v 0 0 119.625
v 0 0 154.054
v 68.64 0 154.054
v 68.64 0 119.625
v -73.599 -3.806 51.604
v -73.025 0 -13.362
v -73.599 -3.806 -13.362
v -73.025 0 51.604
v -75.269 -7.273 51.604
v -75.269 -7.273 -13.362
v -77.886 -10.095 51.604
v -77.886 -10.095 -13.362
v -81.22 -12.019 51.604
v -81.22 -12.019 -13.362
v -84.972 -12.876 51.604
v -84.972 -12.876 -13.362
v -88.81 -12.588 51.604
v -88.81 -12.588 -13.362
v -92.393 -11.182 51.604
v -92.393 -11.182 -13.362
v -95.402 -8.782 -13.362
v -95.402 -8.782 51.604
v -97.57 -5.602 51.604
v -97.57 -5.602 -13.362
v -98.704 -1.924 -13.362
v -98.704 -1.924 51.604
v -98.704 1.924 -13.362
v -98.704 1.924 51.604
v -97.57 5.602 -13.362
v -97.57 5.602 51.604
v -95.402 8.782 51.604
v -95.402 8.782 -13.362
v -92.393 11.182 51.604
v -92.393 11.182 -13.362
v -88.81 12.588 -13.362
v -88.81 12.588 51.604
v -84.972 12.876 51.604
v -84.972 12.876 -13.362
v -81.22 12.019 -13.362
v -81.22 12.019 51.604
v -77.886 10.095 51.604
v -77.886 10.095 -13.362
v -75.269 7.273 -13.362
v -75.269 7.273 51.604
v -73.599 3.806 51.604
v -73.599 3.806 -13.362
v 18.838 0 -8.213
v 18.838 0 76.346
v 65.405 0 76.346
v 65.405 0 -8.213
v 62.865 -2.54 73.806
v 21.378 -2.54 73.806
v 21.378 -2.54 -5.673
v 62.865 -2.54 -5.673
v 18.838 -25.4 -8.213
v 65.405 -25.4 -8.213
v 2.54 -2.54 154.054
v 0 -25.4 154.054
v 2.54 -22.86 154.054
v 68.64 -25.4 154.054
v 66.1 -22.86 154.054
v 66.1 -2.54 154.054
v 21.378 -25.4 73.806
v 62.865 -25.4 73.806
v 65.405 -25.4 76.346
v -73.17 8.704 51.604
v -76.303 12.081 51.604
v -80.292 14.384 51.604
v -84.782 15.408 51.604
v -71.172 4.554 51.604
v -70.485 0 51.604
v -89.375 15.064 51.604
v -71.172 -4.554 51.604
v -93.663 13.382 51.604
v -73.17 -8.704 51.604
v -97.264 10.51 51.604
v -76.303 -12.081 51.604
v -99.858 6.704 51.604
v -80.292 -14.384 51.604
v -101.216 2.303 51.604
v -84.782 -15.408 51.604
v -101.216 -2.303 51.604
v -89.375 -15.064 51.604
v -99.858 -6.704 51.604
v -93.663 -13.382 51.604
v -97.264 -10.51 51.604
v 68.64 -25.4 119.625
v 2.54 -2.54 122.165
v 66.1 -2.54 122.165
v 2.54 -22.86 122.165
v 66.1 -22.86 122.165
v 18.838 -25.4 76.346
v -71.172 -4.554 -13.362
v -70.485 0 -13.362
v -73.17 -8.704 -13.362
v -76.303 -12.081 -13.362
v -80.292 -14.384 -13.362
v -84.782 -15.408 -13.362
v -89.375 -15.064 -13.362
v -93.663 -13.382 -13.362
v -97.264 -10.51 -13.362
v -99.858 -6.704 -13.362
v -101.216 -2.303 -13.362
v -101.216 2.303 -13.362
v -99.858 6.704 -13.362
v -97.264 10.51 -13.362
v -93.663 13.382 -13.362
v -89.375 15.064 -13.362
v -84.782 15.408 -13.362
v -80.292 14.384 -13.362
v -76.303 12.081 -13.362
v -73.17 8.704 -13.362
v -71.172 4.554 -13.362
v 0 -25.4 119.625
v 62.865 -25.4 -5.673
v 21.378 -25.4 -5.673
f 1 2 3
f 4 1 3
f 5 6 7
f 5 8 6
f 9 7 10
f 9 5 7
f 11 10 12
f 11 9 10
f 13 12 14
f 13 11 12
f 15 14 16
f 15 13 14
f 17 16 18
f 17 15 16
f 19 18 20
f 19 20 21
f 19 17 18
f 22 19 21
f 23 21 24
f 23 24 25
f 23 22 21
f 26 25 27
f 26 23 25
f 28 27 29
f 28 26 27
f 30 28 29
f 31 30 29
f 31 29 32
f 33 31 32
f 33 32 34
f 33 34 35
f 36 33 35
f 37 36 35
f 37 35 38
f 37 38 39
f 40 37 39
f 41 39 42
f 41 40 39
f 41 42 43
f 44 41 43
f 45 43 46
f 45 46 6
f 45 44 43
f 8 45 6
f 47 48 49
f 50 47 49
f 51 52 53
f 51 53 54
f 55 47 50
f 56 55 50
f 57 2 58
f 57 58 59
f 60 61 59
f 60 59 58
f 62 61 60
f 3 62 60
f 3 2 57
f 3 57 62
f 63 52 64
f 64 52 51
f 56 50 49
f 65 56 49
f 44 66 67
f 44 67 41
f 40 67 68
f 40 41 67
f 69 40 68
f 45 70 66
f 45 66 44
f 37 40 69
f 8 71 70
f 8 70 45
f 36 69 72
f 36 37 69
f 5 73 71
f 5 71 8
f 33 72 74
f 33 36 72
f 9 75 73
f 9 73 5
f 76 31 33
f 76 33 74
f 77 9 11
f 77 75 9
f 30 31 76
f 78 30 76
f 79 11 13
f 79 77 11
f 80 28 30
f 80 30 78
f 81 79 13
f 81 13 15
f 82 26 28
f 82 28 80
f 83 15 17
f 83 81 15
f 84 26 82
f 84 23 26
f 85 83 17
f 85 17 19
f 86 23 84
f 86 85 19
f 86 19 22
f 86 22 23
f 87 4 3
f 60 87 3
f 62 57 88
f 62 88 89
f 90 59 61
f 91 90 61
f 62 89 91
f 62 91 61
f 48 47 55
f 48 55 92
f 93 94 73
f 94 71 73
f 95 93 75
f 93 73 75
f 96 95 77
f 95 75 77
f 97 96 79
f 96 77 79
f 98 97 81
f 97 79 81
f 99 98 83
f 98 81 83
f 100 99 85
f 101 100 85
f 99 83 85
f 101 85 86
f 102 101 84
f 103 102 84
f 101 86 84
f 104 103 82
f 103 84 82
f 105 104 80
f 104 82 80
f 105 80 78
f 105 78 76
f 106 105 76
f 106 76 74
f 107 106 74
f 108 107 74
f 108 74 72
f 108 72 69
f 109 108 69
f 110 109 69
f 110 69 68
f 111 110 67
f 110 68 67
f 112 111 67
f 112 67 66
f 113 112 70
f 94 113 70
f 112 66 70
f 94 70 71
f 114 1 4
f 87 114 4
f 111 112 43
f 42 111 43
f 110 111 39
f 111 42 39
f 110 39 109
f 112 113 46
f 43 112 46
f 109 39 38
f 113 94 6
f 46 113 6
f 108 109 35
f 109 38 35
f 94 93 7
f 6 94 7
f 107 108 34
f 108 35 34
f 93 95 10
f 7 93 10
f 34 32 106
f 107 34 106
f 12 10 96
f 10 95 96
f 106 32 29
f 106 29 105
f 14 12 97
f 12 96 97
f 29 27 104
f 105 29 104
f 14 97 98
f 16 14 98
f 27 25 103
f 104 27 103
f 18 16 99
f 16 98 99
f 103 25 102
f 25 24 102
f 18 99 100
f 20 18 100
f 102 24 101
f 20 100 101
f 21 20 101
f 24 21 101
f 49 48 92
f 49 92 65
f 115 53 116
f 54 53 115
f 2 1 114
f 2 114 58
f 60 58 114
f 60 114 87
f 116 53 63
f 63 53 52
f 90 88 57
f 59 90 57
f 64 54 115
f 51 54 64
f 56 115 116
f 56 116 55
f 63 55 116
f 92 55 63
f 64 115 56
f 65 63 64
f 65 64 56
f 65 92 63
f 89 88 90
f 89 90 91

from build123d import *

# Parameters (mm, degrees)
F3_W     = 68.6399489641
F3_H     = 34.4287902117
F0_DEPTH = 25.4
F3_W_2   = 15.4516622424
F3_H_2   = 64.9661496282
F3_W_3   = 46.5666726232
F3_H_3   = 84.5590159297
F3_W_4   = 104.7514826059
F3_H_4   = 29.427357018
F2_T     = -2.54
F2_2_T   = -2.54
F2_3_T   = -2.54


with BuildPart() as f0:
    # F3 (on Front) → F0 (new body)
    with BuildSketch(Plane.XZ):
        with Locations((34.3199744821, 136.8397399783)):
            Rectangle(F3_W, F3_H)
    extrude(amount=F0_DEPTH)

    # F2#3
    f2_3_openings = [f0.faces().sort_by_distance(p)[0] for p in [
        (34.319974, -12.7, 154.054135),
    ]]
    offset(amount=F2_3_T, openings=f2_3_openings)


with BuildPart() as f0b:
    # F3 (on Front) → F0, piece 2 (new body)
    with BuildSketch(Plane.XZ):
        with Locations((-78.2108865678, 19.120786339)):
            Rectangle(F3_W_2, F3_H_2)
    extrude(amount=F0_DEPTH)


with BuildPart() as f0c:
    # F3 (on Front) → F0, piece 3 (new body)
    with BuildSketch(Plane.XZ):
        with Locations((42.1216227114, 34.0669490397)):
            Rectangle(F3_W_3, F3_H_3)
    extrude(amount=F0_DEPTH)

    # F2#2
    f2_2_openings = [f0c.faces().sort_by_distance(p)[0] for p in [
        (42.121623, -25.4, 34.066949),
    ]]
    offset(amount=F2_2_T, openings=f2_2_openings)


with BuildPart() as f0d:
    # F3 (on Front) → F0, piece 4 (new body)
    with BuildSketch(Plane.XZ):
        with Locations((-23.4009698033, -83.7902016938)):
            Rectangle(F3_W_4, F3_H_4)
    extrude(amount=F0_DEPTH)


with BuildPart() as f4:
    # F3 (on Front) → F4 (revolve)
    with BuildSketch(Plane.XZ):
        with Locations((-78.2108865678, 19.120786339)):
            Rectangle(F3_W_2, F3_H_2)
    revolve(axis=Axis((-85.936717689, 0, 19.120786339), (0, 0, -1)))

    # F2
    f2_openings = [f4.faces().sort_by_distance(p)[0] for p in [
        (-85.936718, 0, 51.603861),
        (-85.936718, 0, -13.362288),
    ]]
    offset(amount=F2_T, openings=f2_openings)


solid = Compound([f0.part, f0c.part, f4.part])
